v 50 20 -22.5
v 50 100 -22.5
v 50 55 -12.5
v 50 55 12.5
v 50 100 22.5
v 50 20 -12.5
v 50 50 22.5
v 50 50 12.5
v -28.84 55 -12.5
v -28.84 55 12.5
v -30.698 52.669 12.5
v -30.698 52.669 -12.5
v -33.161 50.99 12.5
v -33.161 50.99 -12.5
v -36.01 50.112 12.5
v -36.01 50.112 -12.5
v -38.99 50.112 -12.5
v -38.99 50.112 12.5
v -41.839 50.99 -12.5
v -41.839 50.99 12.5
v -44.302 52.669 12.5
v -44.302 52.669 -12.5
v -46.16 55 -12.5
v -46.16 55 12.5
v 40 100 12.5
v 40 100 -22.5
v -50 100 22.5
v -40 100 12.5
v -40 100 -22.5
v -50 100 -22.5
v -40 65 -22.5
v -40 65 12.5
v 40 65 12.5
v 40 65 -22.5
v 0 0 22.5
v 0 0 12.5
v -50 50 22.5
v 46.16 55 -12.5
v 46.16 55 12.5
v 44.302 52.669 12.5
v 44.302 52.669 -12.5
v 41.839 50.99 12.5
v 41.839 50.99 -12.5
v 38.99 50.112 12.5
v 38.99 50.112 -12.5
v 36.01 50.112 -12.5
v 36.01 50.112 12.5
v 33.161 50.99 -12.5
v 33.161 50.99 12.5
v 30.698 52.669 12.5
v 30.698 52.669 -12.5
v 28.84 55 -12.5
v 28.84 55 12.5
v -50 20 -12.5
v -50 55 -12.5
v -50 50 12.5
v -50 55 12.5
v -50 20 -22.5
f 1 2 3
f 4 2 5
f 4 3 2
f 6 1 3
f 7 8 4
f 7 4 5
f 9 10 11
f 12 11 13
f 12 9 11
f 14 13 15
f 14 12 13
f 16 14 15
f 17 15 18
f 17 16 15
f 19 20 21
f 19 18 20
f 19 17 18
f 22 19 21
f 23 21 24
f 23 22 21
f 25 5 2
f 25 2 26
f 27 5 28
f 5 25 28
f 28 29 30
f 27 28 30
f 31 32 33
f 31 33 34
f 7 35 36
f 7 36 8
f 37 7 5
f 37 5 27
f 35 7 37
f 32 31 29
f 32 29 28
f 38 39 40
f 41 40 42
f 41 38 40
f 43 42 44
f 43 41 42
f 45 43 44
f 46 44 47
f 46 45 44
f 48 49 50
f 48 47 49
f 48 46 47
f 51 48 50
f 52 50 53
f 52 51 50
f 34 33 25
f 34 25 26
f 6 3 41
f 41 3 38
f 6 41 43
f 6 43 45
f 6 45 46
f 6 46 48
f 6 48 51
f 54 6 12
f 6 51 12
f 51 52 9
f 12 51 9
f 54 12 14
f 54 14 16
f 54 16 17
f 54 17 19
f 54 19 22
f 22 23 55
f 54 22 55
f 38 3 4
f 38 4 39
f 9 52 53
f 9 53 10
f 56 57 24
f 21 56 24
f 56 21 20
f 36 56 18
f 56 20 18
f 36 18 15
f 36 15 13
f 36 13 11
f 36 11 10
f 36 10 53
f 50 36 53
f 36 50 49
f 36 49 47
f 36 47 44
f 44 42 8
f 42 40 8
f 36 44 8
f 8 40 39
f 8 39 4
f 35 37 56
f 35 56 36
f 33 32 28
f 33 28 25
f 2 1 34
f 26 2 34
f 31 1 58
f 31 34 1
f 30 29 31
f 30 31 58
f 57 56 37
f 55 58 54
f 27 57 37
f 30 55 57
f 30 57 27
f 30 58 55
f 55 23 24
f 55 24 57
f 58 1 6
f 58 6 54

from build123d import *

# Parameters (mm, degrees)
BOSS_EXTRUDE1_DEPTH       = 100
CUT_EXTRUDE8_DEPTH        = 100
CUT_EXTRUDE8_DEPTH_BACK   = 100
SKETCH4_W                 = 25
SKETCH4_H                 = 55
CUT_EXTRUDE9_DEPTH        = 10
CUT_EXTRUDE10_DEPTH       = 10
SKETCH7_W                 = 80
SKETCH7_H                 = 65
BOSS_EXTRUDE2_DEPTH       = 10
SKETCH8_W                 = 100
SKETCH8_H                 = 20
CUT_EXTRUDE11_DEPTH       = 10
BOSS_EXTRUDE11_DEPTH      = 90
BOSS_EXTRUDE11_DEPTH_BACK = 10
SKETCH9_W                 = 25
SKETCH9_H                 = 15
CUT_EXTRUDE16_DEPTH       = 12.5
CUT_EXTRUDE16_DEPTH_BACK  = 12.5
SKETCH10_OUTSIDE_W        = 131.682
SKETCH10_OUTSIDE_H        = 131.682


with BuildPart() as part:
    # Sketch2 → Boss-Extrude1 (new body)
    with BuildSketch(Plane(origin=(0, 0, 0), x_dir=(1, 0, 0), z_dir=(0, 1, 0))):
        Polygon((-40, 22.5), (-40, -12.5), (40, -12.5), (40, 22.5), (50, 22.5), (50, -22.5), (-50, -22.5), (-50, 22.5), align=None)
    extrude(amount=BOSS_EXTRUDE1_DEPTH)

    # Sketch4 → Cut-Extrude8 (cut, two sides: drawn at the far end of the back side and taken through both)
    with BuildSketch(Plane(origin=(0, 0, 0), x_dir=(0, 0, -1), z_dir=(1, 0, 0)).offset(-CUT_EXTRUDE8_DEPTH_BACK)):
        with Locations((0, 27.5)):
            Rectangle(SKETCH4_W, SKETCH4_H)
    extrude(amount=CUT_EXTRUDE8_DEPTH + CUT_EXTRUDE8_DEPTH_BACK, mode=Mode.SUBTRACT)

    # Sketch5 → Cut-Extrude9 (cut)
    with BuildSketch(Plane.XY.offset(22.5)):
        Polygon((-50, 50), (0, 0), (-50, 0), align=None)
    extrude(amount=-CUT_EXTRUDE9_DEPTH, mode=Mode.SUBTRACT)

    # Sketch6 → Cut-Extrude10 (cut)
    with BuildSketch(Plane.XY.offset(22.5)):
        Polygon((0, 0), (50, 50), (50, 0), align=None)
    extrude(amount=-CUT_EXTRUDE10_DEPTH, mode=Mode.SUBTRACT)


with BuildPart() as body_2:
    # Sketch7 → Boss-Extrude2 (new body)
    with BuildSketch(Plane(origin=(0, 0, -22.5), x_dir=(-1, 0, 0), z_dir=(0, 0, -1))):
        with Locations((0, 32.5)):
            Rectangle(SKETCH7_W, SKETCH7_H)
    extrude(amount=-BOSS_EXTRUDE2_DEPTH)


with BuildPart() as cut_extrude11_tool:
    # Sketch8 → Cut-Extrude11 (new body)
    with BuildSketch(Plane(origin=(0, 0, -22.5), x_dir=(-1, 0, 0), z_dir=(0, 0, -1))):
        with Locations((0, 10)):
            Rectangle(SKETCH8_W, SKETCH8_H)
    extrude(amount=-CUT_EXTRUDE11_DEPTH)


with BuildPart() as part_1:
    add(part.part)

    # Cut-Extrude11: cut by cut_extrude11_tool
    add(cut_extrude11_tool.part, mode=Mode.SUBTRACT)



with BuildPart() as body_2_1:
    add(body_2.part)

    # Cut-Extrude11: cut by cut_extrude11_tool
    add(cut_extrude11_tool.part, mode=Mode.SUBTRACT)


with BuildPart() as part_2:
    add(part_1.part)

    add(body_2_1.part)  # Boss-Extrude11 merges body 2
    # Sketch9 → Boss-Extrude11 (add, two sides: drawn at the far end of the back side and taken through both)
    with BuildSketch(Plane(origin=(-40, 0, 0), x_dir=(0, 0, -1), z_dir=(1, 0, 0)).offset(-BOSS_EXTRUDE11_DEPTH_BACK)):
        with Locations((0, 57.5)):
            Rectangle(SKETCH9_W, SKETCH9_H)
    extrude(amount=BOSS_EXTRUDE11_DEPTH + BOSS_EXTRUDE11_DEPTH_BACK)

    # Sketch10 outside → Cut-Extrude16 (cut, two sides: drawn at the far end of the back side and taken through both)
    with BuildSketch(Plane.XY.offset(-CUT_EXTRUDE16_DEPTH_BACK)):
        with Locations((0, 50)):
            Rectangle(SKETCH10_OUTSIDE_W, SKETCH10_OUTSIDE_H)
        with BuildLine():
            Line((50, 55), (46.160254038, 55))
            ThreePointArc((46.160254038, 55), (37.5, 50), (28.839745962, 55))
            Line((28.839745962, 55), (-28.839745962, 55))
            ThreePointArc((-28.839745962, 55), (-37.5, 50), (-46.160254038, 55))
            Line((-46.160254038, 55), (-50, 55))
            Line((-50, 55), (-50, 100))
            Line((-50, 100), (-40, 100))
            Line((-40, 100), (-40, 65))
            Line((-40, 65), (40, 65))
            Line((40, 65), (40, 100))
            Line((40, 100), (50, 100))
            Line((50, 100), (50, 55))
        make_face(mode=Mode.SUBTRACT)
    extrude(amount=CUT_EXTRUDE16_DEPTH + CUT_EXTRUDE16_DEPTH_BACK, mode=Mode.SUBTRACT)


solid = part_2.part
